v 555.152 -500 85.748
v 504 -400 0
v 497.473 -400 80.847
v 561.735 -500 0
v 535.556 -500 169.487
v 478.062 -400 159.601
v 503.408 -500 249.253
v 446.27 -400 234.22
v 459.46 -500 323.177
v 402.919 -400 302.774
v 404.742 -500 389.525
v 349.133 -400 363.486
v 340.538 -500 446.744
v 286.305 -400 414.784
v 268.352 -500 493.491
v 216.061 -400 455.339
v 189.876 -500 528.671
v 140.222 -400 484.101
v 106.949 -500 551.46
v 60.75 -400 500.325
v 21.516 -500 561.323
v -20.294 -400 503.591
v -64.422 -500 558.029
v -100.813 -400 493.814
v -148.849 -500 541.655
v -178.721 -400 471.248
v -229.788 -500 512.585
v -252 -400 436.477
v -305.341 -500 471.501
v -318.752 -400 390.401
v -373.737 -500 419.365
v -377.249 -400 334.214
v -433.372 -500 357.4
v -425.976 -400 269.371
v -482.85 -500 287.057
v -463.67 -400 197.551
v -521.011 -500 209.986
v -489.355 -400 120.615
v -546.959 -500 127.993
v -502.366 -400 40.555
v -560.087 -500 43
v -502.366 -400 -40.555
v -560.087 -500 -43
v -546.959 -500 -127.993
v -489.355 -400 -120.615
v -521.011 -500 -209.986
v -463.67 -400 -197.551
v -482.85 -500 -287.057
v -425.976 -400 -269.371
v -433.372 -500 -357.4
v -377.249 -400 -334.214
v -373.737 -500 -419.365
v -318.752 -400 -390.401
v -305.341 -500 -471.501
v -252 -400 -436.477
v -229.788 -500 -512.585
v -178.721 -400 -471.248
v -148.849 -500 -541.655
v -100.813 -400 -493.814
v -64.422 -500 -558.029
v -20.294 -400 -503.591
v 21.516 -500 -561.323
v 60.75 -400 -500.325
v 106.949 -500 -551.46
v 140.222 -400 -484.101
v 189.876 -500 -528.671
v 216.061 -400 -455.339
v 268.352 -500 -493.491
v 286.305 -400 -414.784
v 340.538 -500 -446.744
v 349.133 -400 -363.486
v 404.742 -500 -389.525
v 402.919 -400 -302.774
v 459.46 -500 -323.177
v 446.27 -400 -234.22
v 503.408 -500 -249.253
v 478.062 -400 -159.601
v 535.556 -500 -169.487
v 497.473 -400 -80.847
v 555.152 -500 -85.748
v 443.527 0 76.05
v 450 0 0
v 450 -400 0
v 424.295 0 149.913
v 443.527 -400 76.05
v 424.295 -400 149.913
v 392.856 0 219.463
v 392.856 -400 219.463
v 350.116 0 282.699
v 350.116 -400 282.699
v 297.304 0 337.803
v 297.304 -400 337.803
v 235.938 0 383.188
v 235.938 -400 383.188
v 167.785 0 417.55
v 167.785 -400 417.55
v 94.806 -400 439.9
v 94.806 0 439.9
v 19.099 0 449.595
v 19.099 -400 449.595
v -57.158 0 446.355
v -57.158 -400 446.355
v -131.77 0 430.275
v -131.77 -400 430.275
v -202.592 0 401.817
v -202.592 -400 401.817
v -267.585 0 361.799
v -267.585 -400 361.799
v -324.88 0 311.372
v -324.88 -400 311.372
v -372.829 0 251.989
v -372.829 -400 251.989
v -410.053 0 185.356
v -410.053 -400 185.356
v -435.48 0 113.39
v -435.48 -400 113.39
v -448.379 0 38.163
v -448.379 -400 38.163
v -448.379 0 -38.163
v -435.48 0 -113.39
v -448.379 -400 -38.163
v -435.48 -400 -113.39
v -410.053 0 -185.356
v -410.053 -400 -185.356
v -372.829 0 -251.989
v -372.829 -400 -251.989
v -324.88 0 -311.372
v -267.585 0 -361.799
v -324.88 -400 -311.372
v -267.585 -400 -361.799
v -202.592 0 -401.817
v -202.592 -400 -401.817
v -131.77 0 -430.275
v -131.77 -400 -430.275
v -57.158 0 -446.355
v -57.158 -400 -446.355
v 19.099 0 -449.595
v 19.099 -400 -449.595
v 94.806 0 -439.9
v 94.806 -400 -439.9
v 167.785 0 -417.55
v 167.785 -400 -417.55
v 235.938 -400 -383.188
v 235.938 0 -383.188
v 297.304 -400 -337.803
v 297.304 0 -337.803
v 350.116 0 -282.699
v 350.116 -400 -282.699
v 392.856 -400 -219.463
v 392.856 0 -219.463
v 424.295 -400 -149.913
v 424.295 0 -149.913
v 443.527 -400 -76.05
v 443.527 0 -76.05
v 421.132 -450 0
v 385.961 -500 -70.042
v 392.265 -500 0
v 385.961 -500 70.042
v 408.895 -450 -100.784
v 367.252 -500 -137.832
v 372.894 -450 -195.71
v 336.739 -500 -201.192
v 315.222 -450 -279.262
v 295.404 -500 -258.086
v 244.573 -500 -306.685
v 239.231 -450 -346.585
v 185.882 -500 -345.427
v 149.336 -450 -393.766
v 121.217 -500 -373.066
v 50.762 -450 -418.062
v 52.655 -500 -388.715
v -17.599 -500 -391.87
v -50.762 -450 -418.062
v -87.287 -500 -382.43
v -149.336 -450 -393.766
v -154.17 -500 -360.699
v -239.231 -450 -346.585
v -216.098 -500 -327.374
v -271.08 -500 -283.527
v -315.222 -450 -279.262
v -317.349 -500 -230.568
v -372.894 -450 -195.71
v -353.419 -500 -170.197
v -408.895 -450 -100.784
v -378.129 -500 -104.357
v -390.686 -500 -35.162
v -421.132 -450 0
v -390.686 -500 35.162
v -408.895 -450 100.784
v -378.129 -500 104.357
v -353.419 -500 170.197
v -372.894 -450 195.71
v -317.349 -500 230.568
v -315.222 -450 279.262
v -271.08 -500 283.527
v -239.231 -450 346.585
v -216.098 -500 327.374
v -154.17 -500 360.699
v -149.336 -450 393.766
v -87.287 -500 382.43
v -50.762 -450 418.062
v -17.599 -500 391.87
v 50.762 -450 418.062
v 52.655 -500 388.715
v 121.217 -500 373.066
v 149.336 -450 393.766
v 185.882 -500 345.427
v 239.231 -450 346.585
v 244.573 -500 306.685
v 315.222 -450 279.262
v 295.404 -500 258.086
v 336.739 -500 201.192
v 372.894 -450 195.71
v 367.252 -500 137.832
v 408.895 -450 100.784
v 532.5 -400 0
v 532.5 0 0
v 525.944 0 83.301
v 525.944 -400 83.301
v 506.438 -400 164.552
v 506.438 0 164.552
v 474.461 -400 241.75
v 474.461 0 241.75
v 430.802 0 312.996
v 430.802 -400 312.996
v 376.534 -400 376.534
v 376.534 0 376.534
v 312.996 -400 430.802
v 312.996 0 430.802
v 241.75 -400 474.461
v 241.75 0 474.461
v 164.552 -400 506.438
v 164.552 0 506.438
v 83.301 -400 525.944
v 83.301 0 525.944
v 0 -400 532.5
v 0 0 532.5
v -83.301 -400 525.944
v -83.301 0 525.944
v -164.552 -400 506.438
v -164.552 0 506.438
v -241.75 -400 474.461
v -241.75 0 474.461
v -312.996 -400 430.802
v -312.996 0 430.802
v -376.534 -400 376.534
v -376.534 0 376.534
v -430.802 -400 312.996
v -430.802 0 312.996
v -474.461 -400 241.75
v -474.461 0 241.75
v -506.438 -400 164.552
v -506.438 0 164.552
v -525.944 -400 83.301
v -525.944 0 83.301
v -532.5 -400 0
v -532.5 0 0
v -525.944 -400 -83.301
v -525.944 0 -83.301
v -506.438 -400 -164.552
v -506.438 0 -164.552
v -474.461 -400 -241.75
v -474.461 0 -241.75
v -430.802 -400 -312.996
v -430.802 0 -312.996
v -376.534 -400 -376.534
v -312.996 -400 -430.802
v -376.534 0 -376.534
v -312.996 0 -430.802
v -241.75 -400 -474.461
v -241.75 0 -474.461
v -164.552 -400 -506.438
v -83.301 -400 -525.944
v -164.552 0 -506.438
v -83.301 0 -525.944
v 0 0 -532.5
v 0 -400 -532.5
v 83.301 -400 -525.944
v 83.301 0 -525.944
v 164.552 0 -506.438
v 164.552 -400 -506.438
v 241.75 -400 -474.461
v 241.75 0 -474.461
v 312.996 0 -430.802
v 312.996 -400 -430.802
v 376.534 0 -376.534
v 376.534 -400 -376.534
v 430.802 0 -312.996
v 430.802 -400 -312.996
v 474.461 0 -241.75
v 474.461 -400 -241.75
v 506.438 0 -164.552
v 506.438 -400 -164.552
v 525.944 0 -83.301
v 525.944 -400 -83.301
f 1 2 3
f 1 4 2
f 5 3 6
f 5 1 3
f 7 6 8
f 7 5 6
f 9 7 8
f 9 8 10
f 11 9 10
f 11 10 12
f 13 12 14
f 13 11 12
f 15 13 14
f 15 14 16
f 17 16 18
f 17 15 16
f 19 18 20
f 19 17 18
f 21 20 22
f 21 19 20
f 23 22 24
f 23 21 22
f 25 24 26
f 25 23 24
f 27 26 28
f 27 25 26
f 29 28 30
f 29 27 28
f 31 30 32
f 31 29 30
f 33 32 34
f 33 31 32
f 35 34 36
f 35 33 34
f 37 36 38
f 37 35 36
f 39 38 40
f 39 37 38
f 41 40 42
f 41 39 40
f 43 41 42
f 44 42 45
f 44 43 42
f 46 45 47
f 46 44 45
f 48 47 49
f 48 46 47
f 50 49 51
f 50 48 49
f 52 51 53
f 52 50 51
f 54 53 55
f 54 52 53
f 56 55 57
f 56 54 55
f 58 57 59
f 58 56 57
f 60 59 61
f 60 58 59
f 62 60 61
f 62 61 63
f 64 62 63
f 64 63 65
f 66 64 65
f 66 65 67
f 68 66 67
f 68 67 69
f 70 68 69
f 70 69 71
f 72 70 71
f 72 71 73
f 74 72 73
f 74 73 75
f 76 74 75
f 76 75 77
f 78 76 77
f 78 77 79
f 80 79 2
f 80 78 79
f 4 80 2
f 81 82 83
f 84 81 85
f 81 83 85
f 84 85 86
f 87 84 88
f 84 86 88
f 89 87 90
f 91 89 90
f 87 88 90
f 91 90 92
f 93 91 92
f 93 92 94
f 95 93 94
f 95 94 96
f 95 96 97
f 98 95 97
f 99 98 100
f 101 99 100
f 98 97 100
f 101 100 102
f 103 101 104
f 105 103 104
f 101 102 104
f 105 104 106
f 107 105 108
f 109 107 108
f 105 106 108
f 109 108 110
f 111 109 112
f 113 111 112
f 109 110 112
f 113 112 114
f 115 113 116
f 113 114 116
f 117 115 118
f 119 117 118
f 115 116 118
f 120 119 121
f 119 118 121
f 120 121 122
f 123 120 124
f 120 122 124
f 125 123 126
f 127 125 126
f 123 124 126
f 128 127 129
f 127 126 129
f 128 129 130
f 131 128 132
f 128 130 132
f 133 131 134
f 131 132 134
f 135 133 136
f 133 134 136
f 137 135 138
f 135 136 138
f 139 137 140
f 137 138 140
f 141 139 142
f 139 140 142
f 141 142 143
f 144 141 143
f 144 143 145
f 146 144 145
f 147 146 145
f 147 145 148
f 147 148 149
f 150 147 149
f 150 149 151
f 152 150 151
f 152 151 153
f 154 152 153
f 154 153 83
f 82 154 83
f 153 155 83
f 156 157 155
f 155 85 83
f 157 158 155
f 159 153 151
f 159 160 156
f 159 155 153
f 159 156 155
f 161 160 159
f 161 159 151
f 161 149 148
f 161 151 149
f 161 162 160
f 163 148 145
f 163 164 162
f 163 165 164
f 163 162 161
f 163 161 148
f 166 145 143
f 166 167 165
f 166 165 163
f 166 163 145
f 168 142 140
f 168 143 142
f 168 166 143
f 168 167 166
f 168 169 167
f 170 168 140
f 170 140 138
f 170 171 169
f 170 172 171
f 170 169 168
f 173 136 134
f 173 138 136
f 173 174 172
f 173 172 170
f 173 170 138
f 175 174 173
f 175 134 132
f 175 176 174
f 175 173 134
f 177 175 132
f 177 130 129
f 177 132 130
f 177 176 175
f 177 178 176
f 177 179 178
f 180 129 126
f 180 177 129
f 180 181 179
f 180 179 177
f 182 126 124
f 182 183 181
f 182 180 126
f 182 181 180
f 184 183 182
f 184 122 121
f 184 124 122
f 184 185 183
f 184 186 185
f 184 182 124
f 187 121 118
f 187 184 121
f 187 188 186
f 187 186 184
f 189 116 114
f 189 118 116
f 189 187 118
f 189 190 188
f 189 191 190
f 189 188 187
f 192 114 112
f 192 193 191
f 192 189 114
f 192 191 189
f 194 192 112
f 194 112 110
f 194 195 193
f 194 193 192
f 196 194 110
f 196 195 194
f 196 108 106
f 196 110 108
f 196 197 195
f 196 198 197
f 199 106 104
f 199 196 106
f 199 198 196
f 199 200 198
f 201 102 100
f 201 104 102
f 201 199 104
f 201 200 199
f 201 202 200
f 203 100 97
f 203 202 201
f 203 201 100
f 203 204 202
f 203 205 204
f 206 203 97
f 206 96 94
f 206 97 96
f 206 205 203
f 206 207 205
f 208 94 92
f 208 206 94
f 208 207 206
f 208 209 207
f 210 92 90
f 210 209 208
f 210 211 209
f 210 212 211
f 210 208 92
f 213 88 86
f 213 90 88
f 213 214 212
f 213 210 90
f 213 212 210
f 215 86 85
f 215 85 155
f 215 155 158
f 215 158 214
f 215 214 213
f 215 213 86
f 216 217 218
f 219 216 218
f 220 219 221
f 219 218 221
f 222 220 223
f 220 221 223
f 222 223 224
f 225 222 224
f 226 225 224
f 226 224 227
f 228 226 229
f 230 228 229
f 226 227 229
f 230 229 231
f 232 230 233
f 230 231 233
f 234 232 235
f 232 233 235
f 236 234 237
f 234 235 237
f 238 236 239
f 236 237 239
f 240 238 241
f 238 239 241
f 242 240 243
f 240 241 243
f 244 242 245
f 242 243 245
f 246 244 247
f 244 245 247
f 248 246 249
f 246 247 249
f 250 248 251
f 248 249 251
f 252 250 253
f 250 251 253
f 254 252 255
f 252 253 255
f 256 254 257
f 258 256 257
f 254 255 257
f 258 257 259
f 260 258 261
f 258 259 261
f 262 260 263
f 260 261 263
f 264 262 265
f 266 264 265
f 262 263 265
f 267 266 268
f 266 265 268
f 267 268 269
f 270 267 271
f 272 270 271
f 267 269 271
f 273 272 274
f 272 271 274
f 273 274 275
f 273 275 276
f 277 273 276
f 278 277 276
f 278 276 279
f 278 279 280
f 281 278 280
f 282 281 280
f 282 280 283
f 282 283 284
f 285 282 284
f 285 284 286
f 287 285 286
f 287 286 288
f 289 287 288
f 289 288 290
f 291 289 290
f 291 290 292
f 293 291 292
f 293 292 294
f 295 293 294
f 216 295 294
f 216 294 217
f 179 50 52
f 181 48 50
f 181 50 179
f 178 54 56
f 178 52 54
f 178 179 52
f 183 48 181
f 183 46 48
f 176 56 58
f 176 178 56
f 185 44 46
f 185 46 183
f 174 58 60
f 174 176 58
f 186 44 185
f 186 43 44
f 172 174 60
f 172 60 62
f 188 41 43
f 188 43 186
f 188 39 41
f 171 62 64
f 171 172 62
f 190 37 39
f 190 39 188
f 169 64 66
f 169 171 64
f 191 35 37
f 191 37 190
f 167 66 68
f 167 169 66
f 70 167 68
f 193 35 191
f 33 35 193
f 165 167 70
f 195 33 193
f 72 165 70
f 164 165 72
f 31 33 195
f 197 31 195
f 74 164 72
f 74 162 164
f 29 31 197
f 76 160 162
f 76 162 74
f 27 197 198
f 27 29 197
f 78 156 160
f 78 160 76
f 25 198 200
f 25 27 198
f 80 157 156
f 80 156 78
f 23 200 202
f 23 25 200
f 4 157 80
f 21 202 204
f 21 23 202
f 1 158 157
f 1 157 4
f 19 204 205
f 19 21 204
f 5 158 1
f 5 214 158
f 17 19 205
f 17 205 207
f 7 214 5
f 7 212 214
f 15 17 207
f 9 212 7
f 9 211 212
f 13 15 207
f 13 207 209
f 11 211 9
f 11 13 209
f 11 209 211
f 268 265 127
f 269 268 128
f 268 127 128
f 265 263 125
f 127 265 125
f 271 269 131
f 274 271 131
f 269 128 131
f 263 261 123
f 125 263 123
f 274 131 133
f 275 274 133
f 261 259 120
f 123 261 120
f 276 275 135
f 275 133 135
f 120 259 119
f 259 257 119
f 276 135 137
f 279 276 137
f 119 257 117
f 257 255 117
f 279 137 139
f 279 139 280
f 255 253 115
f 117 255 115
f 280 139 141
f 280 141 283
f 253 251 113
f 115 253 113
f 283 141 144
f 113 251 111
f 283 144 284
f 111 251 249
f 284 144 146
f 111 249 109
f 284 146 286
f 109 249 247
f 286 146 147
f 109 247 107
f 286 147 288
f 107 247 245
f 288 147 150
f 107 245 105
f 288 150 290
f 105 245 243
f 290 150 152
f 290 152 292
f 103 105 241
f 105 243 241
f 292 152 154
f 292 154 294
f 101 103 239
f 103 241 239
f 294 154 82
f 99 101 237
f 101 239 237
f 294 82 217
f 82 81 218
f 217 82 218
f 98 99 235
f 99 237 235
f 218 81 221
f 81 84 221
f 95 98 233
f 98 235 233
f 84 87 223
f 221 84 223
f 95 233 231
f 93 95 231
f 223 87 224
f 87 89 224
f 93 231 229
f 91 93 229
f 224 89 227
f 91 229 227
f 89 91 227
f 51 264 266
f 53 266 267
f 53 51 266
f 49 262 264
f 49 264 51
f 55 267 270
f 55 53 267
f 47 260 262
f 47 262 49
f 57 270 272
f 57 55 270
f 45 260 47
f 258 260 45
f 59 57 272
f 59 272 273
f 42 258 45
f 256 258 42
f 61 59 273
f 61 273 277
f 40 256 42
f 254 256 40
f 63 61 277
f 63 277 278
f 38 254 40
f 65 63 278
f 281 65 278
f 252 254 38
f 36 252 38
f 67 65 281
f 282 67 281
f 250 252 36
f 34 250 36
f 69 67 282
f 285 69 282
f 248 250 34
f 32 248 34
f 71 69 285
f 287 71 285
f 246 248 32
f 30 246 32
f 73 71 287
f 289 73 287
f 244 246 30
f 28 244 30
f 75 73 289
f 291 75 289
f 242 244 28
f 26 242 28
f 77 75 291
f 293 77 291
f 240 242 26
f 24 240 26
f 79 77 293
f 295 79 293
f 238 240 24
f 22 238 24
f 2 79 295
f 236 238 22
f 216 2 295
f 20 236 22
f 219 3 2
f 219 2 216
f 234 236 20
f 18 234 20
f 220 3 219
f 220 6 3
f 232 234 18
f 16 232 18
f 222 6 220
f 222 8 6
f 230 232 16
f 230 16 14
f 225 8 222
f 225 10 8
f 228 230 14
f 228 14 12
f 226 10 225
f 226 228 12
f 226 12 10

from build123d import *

# Parameters (mm, degrees)
F0_R     = 532.5
F1_DEPTH = 400
F2_R     = 450
F3_DEPTH = 400
F4_R     = 504
F4_R_2   = 450
F5_DEPTH = 100
F5_TAPER = -30


with BuildPart() as f1:
    # F0 (on Front) → F1 (new body)
    with BuildSketch(Plane.XZ):
        Circle(F0_R)
    extrude(amount=F1_DEPTH)

    # F2 (on face) → F3 (cut)
    with BuildSketch(Plane.XZ.offset(400)):
        Circle(F2_R)
    extrude(amount=-F3_DEPTH, mode=Mode.SUBTRACT)

    # F4 (on face) → F5 (join)
    with BuildSketch(Plane.XZ.offset(400)):
        Circle(F4_R)
        Circle(F4_R_2, mode=Mode.SUBTRACT)
    extrude(amount=F5_DEPTH, taper=F5_TAPER)


solid = f1.part
